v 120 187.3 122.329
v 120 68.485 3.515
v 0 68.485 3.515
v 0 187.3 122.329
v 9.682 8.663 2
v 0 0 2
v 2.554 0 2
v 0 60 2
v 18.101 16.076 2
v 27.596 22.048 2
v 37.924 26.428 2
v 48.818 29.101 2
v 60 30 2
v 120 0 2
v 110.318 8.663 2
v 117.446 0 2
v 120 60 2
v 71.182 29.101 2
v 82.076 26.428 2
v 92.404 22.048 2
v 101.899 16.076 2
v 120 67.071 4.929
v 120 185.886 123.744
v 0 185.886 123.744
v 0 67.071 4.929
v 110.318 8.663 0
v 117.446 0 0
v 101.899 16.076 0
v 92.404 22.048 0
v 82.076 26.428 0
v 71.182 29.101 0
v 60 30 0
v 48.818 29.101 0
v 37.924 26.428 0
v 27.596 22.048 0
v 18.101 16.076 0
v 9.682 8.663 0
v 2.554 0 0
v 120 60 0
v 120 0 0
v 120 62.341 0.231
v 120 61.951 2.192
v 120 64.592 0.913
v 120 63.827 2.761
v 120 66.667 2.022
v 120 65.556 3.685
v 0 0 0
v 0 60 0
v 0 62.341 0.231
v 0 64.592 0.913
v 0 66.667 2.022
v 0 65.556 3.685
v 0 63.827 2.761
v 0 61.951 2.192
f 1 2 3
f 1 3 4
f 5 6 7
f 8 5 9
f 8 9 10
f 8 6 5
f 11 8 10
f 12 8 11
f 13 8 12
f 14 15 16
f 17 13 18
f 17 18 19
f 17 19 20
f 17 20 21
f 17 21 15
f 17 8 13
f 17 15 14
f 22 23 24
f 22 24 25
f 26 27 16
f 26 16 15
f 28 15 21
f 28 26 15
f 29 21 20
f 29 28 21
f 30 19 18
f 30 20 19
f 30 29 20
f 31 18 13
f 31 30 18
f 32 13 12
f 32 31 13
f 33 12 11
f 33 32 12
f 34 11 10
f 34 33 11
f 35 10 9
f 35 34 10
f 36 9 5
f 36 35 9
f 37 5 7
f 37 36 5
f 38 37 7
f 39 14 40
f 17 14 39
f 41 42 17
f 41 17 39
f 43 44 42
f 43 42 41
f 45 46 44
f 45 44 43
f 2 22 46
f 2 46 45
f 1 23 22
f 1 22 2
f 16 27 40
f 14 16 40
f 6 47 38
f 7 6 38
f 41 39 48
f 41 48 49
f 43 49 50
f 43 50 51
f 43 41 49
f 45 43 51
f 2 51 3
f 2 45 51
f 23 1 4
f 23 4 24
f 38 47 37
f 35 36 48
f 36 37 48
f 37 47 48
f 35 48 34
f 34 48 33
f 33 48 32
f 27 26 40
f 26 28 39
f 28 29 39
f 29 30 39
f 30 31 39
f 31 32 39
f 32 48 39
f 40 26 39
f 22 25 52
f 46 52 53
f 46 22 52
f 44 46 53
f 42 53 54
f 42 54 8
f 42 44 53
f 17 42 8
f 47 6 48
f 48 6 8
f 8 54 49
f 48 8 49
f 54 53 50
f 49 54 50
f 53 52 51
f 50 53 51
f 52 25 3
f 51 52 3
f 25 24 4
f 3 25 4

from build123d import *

# Parameters (mm, degrees)
SKETCH_2_W             = 120
SKETCH_2_H             = 60
SM_BASE_FLANGE_1_DEPTH = 2
SM_EDGE_FLANGE_1_DEPTH = 120
CUT_EXTRUDE_3_REACH    = 256.546
SKETCH_3_R             = 70


# Sheet-metal steps are written as plain solids
with BuildPart() as part:
    # Sketch 2 → Базовая кромка1 (new body)
    with BuildSketch(Plane.XY):
        with Locations((60, 30)):
            Rectangle(SKETCH_2_W, SKETCH_2_H)
    extrude(amount=SM_BASE_FLANGE_1_DEPTH)

    # Ребро-кромка1 section (across the edge) → Ребро-кромка1 (add)
    with BuildSketch(Plane(origin=(120, 64.142135624, 2), x_dir=(0, -0.7071067811865438, 0.7071067811865512), z_dir=(-1, 0, 0))):
        with BuildLine():
            Line((-2, 4.142135624), (-2, 172.171572875))
            Line((-2, 172.171572875), (0, 172.171572875))
            Line((0, 172.171572875), (0, 4.142135624))
            ThreePointArc((0, 4.142135624), (0.761204675, 0.3153013), (2.928932188, -2.928932188))
            Line((2.928932188, -2.928932188), (1.514718626, -4.343145751))
            ThreePointArc((1.514718626, -4.343145751), (-1.08655439, -0.450065565), (-2, 4.142135624))
        make_face()
    extrude(amount=SM_EDGE_FLANGE_1_DEPTH)

    # Эскиз3 → Вырез-Вытянуть3 (cut, up to next)
    with BuildSketch(Plane.XY, mode=Mode.PRIVATE) as cut_extrude_3_sk1:
        with Locations((60, -40)):
            Circle(SKETCH_3_R)
    cut_extrude_3_tool1 = extrude(cut_extrude_3_sk1.sketch, amount=CUT_EXTRUDE_3_REACH, mode=Mode.PRIVATE) & part.part
    add(cut_extrude_3_tool1.solids().sort_by_distance((60, -40, 0))[0], mode=Mode.SUBTRACT)


solid = part.part
